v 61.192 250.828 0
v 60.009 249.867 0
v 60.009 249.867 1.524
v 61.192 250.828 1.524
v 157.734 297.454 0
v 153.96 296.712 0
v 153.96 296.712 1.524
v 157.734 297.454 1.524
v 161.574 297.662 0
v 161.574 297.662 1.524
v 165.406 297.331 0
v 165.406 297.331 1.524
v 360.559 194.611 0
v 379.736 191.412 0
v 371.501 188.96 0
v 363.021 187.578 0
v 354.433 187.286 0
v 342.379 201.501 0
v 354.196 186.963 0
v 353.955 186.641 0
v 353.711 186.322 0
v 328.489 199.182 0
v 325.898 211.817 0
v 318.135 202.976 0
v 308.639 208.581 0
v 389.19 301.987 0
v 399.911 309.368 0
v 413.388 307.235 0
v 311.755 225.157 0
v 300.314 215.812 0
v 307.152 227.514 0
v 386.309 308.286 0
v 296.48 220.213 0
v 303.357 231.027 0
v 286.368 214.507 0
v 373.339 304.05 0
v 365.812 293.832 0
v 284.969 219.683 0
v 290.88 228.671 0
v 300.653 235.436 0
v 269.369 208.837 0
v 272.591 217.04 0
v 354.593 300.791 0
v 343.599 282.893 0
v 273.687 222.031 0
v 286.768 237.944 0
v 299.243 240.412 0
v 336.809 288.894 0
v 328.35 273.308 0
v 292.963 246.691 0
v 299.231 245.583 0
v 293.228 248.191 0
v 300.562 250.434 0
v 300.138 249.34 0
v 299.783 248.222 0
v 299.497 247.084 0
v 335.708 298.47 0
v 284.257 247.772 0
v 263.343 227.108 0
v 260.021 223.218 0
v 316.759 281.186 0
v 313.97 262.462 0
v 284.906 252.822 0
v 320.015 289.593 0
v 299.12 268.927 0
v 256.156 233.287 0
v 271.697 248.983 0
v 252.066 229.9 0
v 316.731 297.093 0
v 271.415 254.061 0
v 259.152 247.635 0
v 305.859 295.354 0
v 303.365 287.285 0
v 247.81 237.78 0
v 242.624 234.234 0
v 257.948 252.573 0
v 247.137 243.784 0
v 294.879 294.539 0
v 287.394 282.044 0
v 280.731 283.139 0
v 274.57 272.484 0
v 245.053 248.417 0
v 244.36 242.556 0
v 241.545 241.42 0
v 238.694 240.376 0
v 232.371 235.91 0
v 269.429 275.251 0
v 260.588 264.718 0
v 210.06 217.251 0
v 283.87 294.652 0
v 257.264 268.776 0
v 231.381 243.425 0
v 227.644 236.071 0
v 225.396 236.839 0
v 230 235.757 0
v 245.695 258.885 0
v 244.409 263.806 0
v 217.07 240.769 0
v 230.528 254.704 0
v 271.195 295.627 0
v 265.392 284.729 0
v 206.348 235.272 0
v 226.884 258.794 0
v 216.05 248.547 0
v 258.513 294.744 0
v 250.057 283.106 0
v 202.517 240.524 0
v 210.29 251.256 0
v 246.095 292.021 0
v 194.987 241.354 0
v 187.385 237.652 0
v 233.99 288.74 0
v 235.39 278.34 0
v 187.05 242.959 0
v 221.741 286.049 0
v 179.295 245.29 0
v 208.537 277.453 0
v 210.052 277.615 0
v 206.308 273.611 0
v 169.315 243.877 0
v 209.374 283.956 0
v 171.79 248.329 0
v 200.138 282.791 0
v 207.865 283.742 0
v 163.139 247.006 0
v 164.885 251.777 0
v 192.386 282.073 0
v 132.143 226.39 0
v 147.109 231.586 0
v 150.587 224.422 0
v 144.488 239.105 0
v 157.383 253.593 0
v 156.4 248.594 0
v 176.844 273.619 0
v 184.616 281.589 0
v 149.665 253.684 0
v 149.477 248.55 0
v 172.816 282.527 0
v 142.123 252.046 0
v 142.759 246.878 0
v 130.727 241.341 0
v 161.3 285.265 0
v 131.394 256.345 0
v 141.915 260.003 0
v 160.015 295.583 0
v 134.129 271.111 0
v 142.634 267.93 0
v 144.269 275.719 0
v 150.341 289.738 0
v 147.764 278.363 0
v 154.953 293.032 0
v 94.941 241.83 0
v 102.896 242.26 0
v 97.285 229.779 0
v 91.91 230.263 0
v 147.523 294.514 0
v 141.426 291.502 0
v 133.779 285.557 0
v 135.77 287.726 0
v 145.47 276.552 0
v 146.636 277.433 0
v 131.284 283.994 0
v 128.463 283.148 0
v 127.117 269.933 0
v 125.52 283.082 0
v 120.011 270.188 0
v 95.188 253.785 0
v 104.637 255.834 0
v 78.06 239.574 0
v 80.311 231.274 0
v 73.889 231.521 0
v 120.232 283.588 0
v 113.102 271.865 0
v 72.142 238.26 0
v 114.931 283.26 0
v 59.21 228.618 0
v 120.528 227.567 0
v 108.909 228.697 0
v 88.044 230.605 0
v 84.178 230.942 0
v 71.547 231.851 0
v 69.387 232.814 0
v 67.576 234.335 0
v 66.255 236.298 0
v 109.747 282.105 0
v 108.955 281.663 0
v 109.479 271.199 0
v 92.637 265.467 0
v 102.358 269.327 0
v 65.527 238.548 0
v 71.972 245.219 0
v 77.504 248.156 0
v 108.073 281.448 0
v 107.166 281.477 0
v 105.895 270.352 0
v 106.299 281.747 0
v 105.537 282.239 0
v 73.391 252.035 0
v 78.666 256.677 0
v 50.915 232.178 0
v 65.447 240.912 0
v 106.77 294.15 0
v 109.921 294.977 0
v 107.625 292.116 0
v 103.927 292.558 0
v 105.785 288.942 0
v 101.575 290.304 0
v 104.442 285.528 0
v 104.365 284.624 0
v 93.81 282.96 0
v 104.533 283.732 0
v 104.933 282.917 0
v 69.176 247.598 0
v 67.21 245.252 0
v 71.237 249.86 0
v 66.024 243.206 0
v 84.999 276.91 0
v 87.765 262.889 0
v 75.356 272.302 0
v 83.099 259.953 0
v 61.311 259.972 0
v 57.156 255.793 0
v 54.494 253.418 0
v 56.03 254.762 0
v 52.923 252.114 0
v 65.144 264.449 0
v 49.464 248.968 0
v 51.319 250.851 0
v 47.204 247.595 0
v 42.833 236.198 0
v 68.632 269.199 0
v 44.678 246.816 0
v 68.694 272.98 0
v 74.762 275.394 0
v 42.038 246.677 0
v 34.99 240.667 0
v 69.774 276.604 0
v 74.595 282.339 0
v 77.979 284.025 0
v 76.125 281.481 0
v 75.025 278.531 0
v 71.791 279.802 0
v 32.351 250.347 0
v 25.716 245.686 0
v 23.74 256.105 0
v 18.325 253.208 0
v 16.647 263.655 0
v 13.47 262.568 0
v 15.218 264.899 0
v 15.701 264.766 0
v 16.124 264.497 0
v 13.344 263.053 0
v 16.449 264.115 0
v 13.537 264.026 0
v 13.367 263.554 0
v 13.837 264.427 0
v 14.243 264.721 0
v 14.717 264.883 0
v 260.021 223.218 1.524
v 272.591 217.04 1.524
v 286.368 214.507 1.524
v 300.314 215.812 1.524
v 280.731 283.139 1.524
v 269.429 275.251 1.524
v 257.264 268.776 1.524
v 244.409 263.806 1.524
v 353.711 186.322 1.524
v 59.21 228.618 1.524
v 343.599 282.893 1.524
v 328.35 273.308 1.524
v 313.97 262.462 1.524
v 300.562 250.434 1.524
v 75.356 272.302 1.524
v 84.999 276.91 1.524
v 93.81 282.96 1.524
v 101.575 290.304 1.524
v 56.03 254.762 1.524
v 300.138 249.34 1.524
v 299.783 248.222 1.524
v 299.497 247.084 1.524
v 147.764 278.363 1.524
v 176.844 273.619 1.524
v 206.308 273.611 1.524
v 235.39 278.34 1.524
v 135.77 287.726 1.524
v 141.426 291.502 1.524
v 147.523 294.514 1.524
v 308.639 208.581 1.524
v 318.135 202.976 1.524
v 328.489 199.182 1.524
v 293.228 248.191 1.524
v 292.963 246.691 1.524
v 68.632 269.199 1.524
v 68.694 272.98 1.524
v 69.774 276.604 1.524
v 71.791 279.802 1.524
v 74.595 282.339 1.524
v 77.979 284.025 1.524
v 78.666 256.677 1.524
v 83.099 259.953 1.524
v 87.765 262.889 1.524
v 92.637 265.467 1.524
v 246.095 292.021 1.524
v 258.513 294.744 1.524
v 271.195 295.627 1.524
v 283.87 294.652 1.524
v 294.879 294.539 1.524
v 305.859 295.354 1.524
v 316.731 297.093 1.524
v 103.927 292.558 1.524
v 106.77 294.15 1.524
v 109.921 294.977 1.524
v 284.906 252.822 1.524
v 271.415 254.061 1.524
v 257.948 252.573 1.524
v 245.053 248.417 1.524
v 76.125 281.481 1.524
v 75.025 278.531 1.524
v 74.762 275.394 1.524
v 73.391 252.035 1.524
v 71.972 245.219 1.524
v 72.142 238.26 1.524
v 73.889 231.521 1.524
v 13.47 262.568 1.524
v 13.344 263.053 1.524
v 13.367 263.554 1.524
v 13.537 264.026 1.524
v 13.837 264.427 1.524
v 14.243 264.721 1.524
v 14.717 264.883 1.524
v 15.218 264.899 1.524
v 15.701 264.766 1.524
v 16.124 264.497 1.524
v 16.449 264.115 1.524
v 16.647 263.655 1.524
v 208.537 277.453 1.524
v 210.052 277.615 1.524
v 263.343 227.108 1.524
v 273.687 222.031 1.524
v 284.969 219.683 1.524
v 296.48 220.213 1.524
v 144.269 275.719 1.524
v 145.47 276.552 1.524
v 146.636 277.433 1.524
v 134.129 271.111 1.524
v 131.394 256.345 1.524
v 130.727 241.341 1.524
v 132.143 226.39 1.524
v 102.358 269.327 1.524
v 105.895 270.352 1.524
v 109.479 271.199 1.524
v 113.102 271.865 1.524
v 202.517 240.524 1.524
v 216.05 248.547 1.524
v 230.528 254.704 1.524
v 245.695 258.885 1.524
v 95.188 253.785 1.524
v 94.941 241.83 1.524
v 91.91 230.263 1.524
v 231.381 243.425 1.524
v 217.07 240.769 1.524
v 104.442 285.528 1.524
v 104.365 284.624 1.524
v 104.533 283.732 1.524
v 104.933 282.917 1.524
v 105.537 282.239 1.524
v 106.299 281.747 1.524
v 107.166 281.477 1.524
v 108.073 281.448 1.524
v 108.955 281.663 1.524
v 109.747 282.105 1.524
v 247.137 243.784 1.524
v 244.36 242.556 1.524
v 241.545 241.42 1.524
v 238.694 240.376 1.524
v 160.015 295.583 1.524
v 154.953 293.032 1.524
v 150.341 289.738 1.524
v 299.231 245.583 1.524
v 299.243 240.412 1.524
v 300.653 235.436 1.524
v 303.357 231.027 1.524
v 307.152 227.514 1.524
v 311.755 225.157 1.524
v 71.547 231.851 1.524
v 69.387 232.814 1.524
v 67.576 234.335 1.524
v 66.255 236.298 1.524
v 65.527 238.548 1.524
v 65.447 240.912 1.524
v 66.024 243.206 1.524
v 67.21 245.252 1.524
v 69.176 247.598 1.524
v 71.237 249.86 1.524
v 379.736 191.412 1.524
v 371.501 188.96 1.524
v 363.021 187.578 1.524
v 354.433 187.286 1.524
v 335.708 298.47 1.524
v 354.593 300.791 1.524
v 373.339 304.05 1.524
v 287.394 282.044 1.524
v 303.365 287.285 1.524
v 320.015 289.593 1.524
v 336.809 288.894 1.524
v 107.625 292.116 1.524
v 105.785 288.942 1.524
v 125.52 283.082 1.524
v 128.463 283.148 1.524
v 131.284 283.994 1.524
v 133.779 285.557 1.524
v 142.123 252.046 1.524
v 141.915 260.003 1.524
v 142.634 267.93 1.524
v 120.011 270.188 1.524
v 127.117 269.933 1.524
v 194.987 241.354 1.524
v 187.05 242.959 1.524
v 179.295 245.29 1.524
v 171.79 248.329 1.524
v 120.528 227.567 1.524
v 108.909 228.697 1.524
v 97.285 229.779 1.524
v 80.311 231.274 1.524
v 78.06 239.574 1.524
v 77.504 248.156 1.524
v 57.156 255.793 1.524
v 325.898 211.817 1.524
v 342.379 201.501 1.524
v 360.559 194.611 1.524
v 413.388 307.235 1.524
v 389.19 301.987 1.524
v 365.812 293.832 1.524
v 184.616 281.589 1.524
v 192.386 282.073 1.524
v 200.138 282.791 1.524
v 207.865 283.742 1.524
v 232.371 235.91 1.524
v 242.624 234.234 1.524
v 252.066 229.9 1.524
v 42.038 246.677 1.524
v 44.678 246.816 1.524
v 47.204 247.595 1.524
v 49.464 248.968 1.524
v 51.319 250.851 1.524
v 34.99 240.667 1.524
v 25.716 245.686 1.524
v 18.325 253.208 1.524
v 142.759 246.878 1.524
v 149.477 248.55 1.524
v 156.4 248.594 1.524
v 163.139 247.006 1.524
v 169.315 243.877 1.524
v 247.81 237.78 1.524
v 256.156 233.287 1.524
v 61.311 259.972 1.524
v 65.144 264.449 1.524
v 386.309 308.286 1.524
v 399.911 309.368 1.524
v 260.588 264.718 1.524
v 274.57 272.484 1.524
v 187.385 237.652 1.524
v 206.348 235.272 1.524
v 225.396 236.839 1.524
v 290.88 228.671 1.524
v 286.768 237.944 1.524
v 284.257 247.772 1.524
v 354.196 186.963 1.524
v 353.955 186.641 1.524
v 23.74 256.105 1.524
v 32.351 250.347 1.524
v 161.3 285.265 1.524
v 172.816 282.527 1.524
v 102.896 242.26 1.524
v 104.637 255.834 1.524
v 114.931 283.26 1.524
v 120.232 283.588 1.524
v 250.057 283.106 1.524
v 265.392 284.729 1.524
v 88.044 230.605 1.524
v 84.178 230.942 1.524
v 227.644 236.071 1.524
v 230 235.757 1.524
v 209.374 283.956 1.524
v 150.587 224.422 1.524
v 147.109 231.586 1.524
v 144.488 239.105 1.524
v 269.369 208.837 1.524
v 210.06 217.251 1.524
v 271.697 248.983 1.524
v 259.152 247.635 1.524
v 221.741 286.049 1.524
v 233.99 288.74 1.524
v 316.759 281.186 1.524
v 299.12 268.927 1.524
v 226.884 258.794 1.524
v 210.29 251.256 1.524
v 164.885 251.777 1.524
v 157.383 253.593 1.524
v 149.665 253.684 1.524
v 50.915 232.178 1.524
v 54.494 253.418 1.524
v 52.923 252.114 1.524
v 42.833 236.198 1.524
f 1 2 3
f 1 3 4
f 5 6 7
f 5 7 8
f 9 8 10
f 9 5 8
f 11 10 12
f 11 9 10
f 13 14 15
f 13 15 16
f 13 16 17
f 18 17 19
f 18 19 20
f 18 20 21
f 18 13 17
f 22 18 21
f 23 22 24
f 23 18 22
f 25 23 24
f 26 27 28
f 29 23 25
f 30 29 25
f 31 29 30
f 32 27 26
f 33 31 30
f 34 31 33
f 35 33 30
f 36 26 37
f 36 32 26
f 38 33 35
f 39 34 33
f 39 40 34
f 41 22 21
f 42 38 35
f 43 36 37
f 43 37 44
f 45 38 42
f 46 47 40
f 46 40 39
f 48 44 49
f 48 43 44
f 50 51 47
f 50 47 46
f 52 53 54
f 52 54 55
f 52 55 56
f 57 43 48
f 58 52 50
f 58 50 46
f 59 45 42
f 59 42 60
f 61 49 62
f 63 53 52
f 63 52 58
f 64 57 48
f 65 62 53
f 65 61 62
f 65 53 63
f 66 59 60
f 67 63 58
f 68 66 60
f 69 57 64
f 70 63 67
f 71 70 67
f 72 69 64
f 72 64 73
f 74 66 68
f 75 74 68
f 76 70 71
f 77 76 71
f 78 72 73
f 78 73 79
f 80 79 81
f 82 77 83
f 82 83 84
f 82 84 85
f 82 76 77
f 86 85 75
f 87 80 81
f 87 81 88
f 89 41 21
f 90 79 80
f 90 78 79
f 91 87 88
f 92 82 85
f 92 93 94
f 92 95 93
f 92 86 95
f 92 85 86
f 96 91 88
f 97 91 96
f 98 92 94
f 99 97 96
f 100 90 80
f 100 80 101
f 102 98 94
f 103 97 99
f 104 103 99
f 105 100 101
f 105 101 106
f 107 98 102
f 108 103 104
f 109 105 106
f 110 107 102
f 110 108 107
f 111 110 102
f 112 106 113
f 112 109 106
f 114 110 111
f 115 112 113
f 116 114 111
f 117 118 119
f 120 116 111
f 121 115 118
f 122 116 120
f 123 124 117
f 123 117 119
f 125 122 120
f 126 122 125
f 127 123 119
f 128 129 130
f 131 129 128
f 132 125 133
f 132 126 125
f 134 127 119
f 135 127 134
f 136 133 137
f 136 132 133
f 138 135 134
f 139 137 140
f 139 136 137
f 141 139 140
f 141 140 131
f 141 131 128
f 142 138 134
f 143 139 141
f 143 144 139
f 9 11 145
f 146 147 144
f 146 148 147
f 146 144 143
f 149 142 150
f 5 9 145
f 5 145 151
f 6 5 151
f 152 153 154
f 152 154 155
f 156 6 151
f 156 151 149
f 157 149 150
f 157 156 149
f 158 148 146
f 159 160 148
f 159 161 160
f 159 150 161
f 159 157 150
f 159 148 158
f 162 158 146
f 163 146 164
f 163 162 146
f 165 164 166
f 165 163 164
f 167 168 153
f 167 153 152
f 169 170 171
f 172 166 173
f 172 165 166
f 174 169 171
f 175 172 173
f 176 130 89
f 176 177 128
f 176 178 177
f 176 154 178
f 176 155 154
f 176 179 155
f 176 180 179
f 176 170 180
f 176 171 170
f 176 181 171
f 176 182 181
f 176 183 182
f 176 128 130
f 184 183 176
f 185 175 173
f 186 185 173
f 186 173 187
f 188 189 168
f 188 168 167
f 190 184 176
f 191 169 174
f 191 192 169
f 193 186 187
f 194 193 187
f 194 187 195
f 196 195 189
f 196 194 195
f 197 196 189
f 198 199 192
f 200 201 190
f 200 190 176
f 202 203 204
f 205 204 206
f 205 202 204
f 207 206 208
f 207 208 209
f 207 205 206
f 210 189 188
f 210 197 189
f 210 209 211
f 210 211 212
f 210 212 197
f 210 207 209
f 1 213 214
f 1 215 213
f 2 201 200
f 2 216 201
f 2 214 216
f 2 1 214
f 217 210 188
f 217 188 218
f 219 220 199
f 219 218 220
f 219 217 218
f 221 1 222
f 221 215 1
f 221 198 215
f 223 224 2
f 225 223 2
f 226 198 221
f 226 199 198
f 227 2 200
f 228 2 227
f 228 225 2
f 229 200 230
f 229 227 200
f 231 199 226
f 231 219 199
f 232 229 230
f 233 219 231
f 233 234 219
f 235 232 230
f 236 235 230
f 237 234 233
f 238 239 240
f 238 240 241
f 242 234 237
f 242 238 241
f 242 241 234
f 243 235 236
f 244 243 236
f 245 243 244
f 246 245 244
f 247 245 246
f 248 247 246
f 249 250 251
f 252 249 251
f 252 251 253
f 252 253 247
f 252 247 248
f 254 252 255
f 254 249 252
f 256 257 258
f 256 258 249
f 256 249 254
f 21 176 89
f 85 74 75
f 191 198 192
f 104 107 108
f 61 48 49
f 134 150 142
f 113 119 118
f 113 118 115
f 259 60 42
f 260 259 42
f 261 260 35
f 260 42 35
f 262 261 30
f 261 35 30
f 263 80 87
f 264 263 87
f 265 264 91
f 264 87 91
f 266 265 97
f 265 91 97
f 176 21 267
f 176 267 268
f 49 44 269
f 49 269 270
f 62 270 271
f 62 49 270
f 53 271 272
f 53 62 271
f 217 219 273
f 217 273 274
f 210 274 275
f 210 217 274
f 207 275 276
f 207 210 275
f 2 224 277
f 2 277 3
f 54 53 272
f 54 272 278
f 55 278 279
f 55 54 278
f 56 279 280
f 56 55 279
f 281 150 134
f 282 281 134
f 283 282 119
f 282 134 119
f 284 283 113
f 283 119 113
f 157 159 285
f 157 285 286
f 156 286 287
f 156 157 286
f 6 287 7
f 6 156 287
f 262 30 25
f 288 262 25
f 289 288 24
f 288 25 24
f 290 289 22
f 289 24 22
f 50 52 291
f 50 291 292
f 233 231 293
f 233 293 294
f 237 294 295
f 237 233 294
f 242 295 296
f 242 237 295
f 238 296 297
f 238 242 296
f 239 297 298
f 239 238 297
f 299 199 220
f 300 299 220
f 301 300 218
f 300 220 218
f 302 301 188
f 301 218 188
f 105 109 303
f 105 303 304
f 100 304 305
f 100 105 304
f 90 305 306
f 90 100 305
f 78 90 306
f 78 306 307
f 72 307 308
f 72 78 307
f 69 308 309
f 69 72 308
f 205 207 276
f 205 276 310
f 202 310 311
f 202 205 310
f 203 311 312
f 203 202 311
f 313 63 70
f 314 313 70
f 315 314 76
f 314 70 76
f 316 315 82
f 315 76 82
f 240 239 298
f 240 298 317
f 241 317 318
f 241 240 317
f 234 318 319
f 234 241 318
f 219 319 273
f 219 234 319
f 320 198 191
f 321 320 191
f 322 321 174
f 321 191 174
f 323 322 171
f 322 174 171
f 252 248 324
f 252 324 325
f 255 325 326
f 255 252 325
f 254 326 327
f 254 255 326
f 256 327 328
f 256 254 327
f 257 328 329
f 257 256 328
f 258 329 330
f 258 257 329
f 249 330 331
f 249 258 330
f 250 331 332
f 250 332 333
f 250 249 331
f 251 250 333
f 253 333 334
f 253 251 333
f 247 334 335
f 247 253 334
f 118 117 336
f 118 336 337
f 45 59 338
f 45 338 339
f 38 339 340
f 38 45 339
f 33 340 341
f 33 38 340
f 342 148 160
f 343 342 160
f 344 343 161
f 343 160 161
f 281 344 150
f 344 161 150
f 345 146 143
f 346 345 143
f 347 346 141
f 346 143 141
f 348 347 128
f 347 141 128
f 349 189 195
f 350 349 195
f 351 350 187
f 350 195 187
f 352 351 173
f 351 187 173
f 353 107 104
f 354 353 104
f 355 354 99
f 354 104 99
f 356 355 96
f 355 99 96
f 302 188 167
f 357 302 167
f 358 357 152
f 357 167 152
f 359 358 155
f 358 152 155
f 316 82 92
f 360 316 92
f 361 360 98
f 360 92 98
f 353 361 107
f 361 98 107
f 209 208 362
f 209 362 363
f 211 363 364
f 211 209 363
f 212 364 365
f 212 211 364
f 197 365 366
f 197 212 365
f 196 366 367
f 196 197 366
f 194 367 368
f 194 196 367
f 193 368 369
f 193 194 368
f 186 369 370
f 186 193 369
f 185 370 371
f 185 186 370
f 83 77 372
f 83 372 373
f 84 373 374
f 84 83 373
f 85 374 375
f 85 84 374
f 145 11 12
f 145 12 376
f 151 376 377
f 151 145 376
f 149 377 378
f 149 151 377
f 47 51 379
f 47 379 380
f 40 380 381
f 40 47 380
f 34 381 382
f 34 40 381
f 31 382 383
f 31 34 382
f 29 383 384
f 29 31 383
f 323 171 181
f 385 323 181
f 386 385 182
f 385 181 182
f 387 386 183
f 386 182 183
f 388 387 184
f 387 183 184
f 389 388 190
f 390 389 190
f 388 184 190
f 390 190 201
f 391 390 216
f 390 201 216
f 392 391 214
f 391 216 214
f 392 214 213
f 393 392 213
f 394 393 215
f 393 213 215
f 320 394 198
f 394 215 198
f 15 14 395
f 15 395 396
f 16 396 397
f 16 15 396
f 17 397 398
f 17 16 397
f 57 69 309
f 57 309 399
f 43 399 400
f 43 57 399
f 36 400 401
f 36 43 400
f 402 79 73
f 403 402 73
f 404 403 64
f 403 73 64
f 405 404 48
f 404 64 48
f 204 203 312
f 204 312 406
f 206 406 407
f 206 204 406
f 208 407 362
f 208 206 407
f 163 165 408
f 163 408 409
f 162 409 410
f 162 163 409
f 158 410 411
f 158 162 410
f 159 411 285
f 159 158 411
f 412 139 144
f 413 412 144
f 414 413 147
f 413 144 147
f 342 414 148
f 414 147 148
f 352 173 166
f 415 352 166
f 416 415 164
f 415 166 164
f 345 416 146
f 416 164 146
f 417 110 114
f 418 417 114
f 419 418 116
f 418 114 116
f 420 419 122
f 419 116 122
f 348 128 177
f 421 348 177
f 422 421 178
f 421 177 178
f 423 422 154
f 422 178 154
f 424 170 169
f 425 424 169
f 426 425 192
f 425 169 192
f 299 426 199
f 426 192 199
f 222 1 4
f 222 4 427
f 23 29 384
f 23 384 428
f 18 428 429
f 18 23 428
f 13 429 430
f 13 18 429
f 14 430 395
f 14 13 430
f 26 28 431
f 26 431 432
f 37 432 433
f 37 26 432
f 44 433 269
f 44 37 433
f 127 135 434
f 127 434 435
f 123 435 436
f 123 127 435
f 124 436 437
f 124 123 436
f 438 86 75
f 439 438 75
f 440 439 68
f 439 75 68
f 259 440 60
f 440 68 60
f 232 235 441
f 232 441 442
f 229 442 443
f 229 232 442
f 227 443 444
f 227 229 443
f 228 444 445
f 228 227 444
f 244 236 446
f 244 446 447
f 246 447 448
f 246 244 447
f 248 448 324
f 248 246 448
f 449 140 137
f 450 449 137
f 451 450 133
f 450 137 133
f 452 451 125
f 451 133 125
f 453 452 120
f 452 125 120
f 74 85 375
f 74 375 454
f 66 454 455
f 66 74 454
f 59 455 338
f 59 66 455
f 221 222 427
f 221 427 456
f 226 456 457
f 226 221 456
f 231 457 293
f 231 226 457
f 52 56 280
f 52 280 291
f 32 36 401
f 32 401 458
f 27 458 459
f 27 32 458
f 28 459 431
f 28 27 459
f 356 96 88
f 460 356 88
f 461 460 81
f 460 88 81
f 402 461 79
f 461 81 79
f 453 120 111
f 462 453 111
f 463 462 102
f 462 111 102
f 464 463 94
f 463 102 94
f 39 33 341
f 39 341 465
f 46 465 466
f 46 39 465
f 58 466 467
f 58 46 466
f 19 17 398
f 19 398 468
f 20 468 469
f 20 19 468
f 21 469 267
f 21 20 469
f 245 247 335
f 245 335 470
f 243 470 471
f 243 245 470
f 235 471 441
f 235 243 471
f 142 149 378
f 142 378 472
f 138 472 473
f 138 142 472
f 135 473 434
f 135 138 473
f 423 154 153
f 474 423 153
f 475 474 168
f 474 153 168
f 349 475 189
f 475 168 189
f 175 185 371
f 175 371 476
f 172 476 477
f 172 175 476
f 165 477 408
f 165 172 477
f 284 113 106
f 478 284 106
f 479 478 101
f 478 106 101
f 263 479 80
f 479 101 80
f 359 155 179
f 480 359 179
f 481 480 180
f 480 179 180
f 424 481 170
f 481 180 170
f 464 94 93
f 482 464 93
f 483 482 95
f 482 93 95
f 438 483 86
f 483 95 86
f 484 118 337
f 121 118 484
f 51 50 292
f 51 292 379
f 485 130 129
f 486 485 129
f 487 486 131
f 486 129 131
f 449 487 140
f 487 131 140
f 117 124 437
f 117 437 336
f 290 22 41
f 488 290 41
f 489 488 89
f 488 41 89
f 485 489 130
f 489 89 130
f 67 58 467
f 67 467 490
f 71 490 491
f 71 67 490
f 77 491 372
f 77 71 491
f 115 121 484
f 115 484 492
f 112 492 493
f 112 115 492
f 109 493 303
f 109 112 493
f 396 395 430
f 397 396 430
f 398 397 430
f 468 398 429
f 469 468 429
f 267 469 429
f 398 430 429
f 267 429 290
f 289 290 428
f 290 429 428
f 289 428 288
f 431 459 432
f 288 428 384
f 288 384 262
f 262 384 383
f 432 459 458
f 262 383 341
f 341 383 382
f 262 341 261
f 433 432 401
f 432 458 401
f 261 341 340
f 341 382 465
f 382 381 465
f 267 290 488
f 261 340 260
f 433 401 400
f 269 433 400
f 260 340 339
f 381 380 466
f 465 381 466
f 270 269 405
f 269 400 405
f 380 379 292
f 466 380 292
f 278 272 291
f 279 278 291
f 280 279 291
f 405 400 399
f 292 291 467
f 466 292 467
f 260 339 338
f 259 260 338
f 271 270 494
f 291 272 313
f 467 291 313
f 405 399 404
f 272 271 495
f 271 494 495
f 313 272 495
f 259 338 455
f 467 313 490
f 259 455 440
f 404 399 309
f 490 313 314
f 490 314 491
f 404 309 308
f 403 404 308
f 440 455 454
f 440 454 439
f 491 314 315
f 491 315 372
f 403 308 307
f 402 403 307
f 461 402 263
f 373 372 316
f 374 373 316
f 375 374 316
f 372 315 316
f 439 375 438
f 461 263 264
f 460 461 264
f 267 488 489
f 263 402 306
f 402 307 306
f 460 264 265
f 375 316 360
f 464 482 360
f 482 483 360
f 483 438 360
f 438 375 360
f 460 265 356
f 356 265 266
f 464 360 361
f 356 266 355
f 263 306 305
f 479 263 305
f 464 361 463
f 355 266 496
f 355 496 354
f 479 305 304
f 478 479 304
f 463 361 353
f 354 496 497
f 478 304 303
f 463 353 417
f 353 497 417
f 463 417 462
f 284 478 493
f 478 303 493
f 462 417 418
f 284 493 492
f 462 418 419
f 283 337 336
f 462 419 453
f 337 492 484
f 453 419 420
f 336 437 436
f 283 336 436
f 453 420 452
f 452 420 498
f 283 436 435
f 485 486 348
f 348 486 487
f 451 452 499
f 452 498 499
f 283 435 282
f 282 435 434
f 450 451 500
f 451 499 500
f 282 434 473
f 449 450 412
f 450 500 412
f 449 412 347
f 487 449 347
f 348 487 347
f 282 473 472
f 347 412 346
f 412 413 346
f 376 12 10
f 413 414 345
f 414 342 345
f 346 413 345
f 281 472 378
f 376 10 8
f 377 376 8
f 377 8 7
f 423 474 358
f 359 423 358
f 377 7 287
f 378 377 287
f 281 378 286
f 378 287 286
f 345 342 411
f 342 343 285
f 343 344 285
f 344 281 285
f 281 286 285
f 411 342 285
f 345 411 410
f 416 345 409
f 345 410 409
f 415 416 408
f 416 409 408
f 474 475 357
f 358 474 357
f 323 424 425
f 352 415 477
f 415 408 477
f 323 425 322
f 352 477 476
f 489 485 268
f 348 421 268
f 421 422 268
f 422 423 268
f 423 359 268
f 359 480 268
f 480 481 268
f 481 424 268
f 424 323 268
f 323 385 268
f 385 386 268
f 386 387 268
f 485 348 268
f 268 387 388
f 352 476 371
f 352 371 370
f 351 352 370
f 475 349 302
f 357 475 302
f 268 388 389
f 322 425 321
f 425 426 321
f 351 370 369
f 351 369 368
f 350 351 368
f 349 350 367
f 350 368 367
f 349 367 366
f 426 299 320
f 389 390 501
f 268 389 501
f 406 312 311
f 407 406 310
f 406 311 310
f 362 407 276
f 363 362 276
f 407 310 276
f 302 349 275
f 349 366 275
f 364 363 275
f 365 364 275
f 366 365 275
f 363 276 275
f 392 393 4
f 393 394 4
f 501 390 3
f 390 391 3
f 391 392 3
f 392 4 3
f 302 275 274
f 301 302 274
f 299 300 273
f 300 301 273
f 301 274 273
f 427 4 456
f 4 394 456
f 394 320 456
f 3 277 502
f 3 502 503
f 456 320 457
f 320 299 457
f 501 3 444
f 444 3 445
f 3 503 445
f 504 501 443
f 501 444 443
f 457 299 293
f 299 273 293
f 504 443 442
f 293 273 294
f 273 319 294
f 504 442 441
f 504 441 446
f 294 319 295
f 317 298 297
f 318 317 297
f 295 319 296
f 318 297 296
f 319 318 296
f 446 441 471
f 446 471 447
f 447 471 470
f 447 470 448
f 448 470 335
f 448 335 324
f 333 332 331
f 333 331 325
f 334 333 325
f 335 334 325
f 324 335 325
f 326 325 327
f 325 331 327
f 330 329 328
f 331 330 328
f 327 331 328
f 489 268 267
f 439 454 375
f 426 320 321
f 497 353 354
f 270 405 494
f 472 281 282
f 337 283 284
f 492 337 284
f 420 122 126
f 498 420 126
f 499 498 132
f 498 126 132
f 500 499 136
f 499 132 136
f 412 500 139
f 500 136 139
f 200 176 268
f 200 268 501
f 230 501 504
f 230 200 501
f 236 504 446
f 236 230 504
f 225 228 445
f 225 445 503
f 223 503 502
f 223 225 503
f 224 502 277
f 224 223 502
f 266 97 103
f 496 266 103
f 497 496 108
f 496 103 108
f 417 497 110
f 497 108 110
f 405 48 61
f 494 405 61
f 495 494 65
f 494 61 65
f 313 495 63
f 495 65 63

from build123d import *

# Parameters (mm, degrees)
BOSS_EXTRUDE1_DEPTH = 1.524


with BuildPart() as part:
    # Sketch1 → Boss-Extrude1 (new body)
    with BuildSketch(Plane.XY):
        with BuildLine():
            Line((299.496674555, 247.083909986), (293.228442315, 248.191486466))
            Line((293.228442315, 248.191486466), (292.963264261, 246.690734455))
            Line((292.963264261, 246.690734455), (299.231496501, 245.583157975))
            ThreePointArc((299.231496501, 245.583157975), (301.853890913, 233.138709027), (311.755483248, 225.157497886))
            ThreePointArc((311.755483248, 225.157497886), (342.378628376, 201.501430101), (379.736207542, 191.411938565))
            ThreePointArc((379.736207542, 191.411938565), (367.282944414, 188.133579217), (354.433282196, 187.286476253))
            ThreePointArc((354.433282196, 187.286476253), (354.075780486, 186.801693195), (353.711488573, 186.321991739))
            Line((353.711488573, 186.321991739), (59.210439319, 228.618287464))
            ThreePointArc((59.210439319, 228.618287464), (46.845732275, 234.131121821), (34.989718338, 240.66658328))
            ThreePointArc((34.989718338, 240.66658328), (21.739819765, 249.170959745), (13.469532472, 262.568219888))
            ThreePointArc((13.469532472, 262.568219888), (14.473805053, 264.820038124), (16.64661192, 263.65463729))
            ThreePointArc((16.64661192, 263.65463729), (27.881645016, 252.981360845), (42.038095614, 246.677417222))
            ThreePointArc((42.038095614, 246.677417222), (47.204267049, 247.59528857), (51.319192238, 250.850930717))
            ThreePointArc((51.319192238, 250.850930717), (53.712623356, 252.761043669), (56.030286878, 254.76241315))
            Line((56.030286878, 254.76241315), (60.009228178, 249.866621656))
            Line((60.009228178, 249.866621656), (61.191894588, 250.827806426))
            Line((61.191894588, 250.827806426), (57.156306316, 255.793297808))
            ThreePointArc((57.156306316, 255.793297808), (63.269330312, 262.174956241), (68.631929607, 269.198997493))
            ThreePointArc((68.631929607, 269.198997493), (70.672937053, 278.271974974), (77.97930542, 284.025375103))
            ThreePointArc((77.97930542, 284.025375103), (75.025286429, 278.530980407), (75.355674106, 272.301578731))
            ThreePointArc((75.355674106, 272.301578731), (89.522712553, 279.763084543), (101.575381834, 290.304062227))
            ThreePointArc((101.575381834, 290.304062227), (105.298186283, 293.444448732), (109.921107262, 294.977387738))
            ThreePointArc((109.921107262, 294.977387738), (106.645115294, 290.563839268), (104.441699592, 285.528316185))
            ThreePointArc((104.441699592, 285.528316185), (105.901175076, 281.967449489), (109.74705726, 282.10540072))
            ThreePointArc((109.74705726, 282.10540072), (117.575446144, 283.528434685), (125.519570472, 283.081683228))
            ThreePointArc((125.519570472, 283.081683228), (131.283660572, 283.993726612), (135.76973662, 287.726243123))
            ThreePointArc((135.76973662, 287.726243123), (144.425837897, 293.107350234), (153.959513951, 296.711989461))
            ThreePointArc((153.959513951, 296.711989461), (159.650281584, 297.625042258), (165.406340408, 297.331293248))
            ThreePointArc((165.406340408, 297.331293248), (157.435124743, 294.404562686), (150.340503018, 289.738475081))
            ThreePointArc((150.340503018, 289.738475081), (167.005302639, 283.674185668), (184.616227681, 281.589366329))
            ThreePointArc((184.616227681, 281.589366329), (196.264753754, 282.403178747), (207.864638646, 283.742253372))
            Line((207.864638646, 283.742253372), (208.536964433, 277.452860551))
            Line((208.536964433, 277.452860551), (210.052330785, 277.614850731))
            Line((210.052330785, 277.614850731), (209.374499216, 283.955748378))
            ThreePointArc((209.374499216, 283.955748378), (227.881790203, 287.319954151), (246.095409129, 292.02120779))
            ThreePointArc((246.095409129, 292.02120779), (264.837645669, 295.417547796), (283.869742792, 294.652149172))
            ThreePointArc((283.869742792, 294.652149172), (300.377514826, 294.830345717), (316.730515739, 297.09256867))
            ThreePointArc((316.730515739, 297.09256867), (345.164765747, 299.513120241), (373.338877641, 304.050196657))
            ThreePointArc((373.338877641, 304.050196657), (393.078041438, 309.22946311), (413.38768552, 307.235034456))
            ThreePointArc((413.38768552, 307.235034456), (377.376618301, 298.266191923), (343.59946469, 282.892806069))
            ThreePointArc((343.59946469, 282.892806069), (321.044455039, 268.037495843), (300.562470929, 250.433603398))
            ThreePointArc((300.562470929, 250.433603398), (299.951704088, 248.78353273), (299.496674555, 247.083909986))
        make_face()
        with BuildLine():
            ThreePointArc((328.489226954, 199.182421434), (239.736316258, 213.199295119), (150.587010018, 224.42217807))
            ThreePointArc((150.587010018, 224.42217807), (145.688890945, 235.30713064), (142.759093928, 246.878217553))
            ThreePointArc((142.759093928, 246.878217553), (156.400368795, 248.593878404), (169.314596837, 243.8768257))
            ThreePointArc((169.314596837, 243.8768257), (196.80467914, 235.971060868), (225.395801684, 236.839078326))
            ThreePointArc((225.395801684, 236.839078326), (228.814239063, 235.855643459), (232.370913957, 235.909698546))
            ThreePointArc((232.370913957, 235.909698546), (247.490619756, 232.384573367), (260.020733604, 223.217880511))
            ThreePointArc((260.020733604, 223.217880511), (279.392290374, 215.299092788), (300.31360184, 215.812061861))
            ThreePointArc((300.31360184, 215.812061861), (313.259683309, 205.562804926), (328.489226954, 199.182421434))
        make_face(mode=Mode.SUBTRACT)
        with BuildLine():
            ThreePointArc((73.889360105, 231.521400998), (66.254747612, 236.297695357), (67.210403263, 245.252415788))
            ThreePointArc((67.210403263, 245.252415788), (70.194674676, 248.739861019), (73.390521828, 252.034509875))
            ThreePointArc((73.390521828, 252.034509875), (71.857270881, 241.734604422), (73.889360105, 231.521400998))
        make_face(mode=Mode.SUBTRACT)
        with BuildLine():
            ThreePointArc((113.10156747, 271.864588213), (123.557739252, 269.880401171), (134.129074941, 271.111412263))
            ThreePointArc((134.129074941, 271.111412263), (130.799977878, 248.854403449), (132.142963674, 226.389904395))
            ThreePointArc((132.142963674, 226.389904395), (114.719074022, 228.137810366), (97.284812247, 229.779036204))
            ThreePointArc((97.284812247, 229.779036204), (104.267717835, 248.98290031), (102.357800113, 269.327471609))
            ThreePointArc((102.357800113, 269.327471609), (107.682050527, 270.797739485), (113.10156747, 271.864588213))
        make_face(mode=Mode.SUBTRACT)
        with BuildLine():
            ThreePointArc((147.76400458, 278.362692247), (191.575815975, 273.02026788), (235.390344097, 278.340365744))
            ThreePointArc((235.390344097, 278.340365744), (257.681856345, 284.318322066), (280.730860591, 283.138964891))
            ThreePointArc((280.730860591, 283.138964891), (263.443829779, 271.830407732), (244.408703812, 263.806139622))
            ThreePointArc((244.408703812, 263.806139622), (218.447725967, 255.331740571), (194.986699965, 241.354327761))
            ThreePointArc((194.986699965, 241.354327761), (183.145599945, 244.034647083), (171.789821421, 248.329068519))
            ThreePointArc((171.789821421, 248.329068519), (157.383066968, 253.59262513), (142.123022895, 252.046450178))
            ThreePointArc((142.123022895, 252.046450178), (142.159172604, 263.976764596), (144.269250711, 275.719050545))
            ThreePointArc((144.269250711, 275.719050545), (146.057798086, 276.986446261), (147.76400458, 278.362692247))
        make_face(mode=Mode.SUBTRACT)
        with BuildLine():
            ThreePointArc((287.393755321, 282.043602932), (311.637801497, 288.812820245), (336.809005326, 288.893911982))
            ThreePointArc((336.809005326, 288.893911982), (307.570989951, 275.586964292), (284.906320156, 252.821878241))
            ThreePointArc((284.906320156, 252.821878241), (264.644027419, 253.656561884), (245.053092851, 248.417049837))
            ThreePointArc((245.053092851, 248.417049837), (224.280647922, 241.798667768), (202.516617159, 240.524142565))
            ThreePointArc((202.516617159, 240.524142565), (223.186364423, 251.866283632), (245.694745472, 258.884502671))
            ThreePointArc((245.694745472, 258.884502671), (267.708759315, 268.367301705), (287.393755321, 282.043602932))
        make_face(mode=Mode.SUBTRACT)
        with BuildLine():
            ThreePointArc((92.637447972, 265.466743872), (95.417062565, 247.800095776), (91.910427153, 230.263271083))
            ThreePointArc((91.910427153, 230.263271083), (86.111065378, 230.774336481), (80.310675632, 231.273599578))
            ThreePointArc((80.310675632, 231.273599578), (77.567314948, 243.850784297), (78.665529568, 256.676755136))
            ThreePointArc((78.665529568, 256.676755136), (85.404291465, 261.464676125), (92.637447972, 265.466743872))
        make_face(mode=Mode.SUBTRACT)
        with BuildLine():
            ThreePointArc((284.256505511, 247.772083796), (265.390502286, 248.627841972), (247.136907632, 243.783806264))
            ThreePointArc((247.136907632, 243.783806264), (242.957516866, 241.976149158), (238.694255905, 240.376293737))
            ThreePointArc((238.694255905, 240.376293737), (252.104272767, 235.759131886), (263.342997343, 227.108247207))
            ThreePointArc((263.342997343, 227.108247207), (279.254554924, 220.502299636), (296.480474873, 220.212662162))
            ThreePointArc((296.480474873, 220.212662162), (288.629921984, 233.221231814), (284.256505511, 247.772083796))
        make_face(mode=Mode.SUBTRACT)
    extrude(amount=BOSS_EXTRUDE1_DEPTH)


solid = part.part
